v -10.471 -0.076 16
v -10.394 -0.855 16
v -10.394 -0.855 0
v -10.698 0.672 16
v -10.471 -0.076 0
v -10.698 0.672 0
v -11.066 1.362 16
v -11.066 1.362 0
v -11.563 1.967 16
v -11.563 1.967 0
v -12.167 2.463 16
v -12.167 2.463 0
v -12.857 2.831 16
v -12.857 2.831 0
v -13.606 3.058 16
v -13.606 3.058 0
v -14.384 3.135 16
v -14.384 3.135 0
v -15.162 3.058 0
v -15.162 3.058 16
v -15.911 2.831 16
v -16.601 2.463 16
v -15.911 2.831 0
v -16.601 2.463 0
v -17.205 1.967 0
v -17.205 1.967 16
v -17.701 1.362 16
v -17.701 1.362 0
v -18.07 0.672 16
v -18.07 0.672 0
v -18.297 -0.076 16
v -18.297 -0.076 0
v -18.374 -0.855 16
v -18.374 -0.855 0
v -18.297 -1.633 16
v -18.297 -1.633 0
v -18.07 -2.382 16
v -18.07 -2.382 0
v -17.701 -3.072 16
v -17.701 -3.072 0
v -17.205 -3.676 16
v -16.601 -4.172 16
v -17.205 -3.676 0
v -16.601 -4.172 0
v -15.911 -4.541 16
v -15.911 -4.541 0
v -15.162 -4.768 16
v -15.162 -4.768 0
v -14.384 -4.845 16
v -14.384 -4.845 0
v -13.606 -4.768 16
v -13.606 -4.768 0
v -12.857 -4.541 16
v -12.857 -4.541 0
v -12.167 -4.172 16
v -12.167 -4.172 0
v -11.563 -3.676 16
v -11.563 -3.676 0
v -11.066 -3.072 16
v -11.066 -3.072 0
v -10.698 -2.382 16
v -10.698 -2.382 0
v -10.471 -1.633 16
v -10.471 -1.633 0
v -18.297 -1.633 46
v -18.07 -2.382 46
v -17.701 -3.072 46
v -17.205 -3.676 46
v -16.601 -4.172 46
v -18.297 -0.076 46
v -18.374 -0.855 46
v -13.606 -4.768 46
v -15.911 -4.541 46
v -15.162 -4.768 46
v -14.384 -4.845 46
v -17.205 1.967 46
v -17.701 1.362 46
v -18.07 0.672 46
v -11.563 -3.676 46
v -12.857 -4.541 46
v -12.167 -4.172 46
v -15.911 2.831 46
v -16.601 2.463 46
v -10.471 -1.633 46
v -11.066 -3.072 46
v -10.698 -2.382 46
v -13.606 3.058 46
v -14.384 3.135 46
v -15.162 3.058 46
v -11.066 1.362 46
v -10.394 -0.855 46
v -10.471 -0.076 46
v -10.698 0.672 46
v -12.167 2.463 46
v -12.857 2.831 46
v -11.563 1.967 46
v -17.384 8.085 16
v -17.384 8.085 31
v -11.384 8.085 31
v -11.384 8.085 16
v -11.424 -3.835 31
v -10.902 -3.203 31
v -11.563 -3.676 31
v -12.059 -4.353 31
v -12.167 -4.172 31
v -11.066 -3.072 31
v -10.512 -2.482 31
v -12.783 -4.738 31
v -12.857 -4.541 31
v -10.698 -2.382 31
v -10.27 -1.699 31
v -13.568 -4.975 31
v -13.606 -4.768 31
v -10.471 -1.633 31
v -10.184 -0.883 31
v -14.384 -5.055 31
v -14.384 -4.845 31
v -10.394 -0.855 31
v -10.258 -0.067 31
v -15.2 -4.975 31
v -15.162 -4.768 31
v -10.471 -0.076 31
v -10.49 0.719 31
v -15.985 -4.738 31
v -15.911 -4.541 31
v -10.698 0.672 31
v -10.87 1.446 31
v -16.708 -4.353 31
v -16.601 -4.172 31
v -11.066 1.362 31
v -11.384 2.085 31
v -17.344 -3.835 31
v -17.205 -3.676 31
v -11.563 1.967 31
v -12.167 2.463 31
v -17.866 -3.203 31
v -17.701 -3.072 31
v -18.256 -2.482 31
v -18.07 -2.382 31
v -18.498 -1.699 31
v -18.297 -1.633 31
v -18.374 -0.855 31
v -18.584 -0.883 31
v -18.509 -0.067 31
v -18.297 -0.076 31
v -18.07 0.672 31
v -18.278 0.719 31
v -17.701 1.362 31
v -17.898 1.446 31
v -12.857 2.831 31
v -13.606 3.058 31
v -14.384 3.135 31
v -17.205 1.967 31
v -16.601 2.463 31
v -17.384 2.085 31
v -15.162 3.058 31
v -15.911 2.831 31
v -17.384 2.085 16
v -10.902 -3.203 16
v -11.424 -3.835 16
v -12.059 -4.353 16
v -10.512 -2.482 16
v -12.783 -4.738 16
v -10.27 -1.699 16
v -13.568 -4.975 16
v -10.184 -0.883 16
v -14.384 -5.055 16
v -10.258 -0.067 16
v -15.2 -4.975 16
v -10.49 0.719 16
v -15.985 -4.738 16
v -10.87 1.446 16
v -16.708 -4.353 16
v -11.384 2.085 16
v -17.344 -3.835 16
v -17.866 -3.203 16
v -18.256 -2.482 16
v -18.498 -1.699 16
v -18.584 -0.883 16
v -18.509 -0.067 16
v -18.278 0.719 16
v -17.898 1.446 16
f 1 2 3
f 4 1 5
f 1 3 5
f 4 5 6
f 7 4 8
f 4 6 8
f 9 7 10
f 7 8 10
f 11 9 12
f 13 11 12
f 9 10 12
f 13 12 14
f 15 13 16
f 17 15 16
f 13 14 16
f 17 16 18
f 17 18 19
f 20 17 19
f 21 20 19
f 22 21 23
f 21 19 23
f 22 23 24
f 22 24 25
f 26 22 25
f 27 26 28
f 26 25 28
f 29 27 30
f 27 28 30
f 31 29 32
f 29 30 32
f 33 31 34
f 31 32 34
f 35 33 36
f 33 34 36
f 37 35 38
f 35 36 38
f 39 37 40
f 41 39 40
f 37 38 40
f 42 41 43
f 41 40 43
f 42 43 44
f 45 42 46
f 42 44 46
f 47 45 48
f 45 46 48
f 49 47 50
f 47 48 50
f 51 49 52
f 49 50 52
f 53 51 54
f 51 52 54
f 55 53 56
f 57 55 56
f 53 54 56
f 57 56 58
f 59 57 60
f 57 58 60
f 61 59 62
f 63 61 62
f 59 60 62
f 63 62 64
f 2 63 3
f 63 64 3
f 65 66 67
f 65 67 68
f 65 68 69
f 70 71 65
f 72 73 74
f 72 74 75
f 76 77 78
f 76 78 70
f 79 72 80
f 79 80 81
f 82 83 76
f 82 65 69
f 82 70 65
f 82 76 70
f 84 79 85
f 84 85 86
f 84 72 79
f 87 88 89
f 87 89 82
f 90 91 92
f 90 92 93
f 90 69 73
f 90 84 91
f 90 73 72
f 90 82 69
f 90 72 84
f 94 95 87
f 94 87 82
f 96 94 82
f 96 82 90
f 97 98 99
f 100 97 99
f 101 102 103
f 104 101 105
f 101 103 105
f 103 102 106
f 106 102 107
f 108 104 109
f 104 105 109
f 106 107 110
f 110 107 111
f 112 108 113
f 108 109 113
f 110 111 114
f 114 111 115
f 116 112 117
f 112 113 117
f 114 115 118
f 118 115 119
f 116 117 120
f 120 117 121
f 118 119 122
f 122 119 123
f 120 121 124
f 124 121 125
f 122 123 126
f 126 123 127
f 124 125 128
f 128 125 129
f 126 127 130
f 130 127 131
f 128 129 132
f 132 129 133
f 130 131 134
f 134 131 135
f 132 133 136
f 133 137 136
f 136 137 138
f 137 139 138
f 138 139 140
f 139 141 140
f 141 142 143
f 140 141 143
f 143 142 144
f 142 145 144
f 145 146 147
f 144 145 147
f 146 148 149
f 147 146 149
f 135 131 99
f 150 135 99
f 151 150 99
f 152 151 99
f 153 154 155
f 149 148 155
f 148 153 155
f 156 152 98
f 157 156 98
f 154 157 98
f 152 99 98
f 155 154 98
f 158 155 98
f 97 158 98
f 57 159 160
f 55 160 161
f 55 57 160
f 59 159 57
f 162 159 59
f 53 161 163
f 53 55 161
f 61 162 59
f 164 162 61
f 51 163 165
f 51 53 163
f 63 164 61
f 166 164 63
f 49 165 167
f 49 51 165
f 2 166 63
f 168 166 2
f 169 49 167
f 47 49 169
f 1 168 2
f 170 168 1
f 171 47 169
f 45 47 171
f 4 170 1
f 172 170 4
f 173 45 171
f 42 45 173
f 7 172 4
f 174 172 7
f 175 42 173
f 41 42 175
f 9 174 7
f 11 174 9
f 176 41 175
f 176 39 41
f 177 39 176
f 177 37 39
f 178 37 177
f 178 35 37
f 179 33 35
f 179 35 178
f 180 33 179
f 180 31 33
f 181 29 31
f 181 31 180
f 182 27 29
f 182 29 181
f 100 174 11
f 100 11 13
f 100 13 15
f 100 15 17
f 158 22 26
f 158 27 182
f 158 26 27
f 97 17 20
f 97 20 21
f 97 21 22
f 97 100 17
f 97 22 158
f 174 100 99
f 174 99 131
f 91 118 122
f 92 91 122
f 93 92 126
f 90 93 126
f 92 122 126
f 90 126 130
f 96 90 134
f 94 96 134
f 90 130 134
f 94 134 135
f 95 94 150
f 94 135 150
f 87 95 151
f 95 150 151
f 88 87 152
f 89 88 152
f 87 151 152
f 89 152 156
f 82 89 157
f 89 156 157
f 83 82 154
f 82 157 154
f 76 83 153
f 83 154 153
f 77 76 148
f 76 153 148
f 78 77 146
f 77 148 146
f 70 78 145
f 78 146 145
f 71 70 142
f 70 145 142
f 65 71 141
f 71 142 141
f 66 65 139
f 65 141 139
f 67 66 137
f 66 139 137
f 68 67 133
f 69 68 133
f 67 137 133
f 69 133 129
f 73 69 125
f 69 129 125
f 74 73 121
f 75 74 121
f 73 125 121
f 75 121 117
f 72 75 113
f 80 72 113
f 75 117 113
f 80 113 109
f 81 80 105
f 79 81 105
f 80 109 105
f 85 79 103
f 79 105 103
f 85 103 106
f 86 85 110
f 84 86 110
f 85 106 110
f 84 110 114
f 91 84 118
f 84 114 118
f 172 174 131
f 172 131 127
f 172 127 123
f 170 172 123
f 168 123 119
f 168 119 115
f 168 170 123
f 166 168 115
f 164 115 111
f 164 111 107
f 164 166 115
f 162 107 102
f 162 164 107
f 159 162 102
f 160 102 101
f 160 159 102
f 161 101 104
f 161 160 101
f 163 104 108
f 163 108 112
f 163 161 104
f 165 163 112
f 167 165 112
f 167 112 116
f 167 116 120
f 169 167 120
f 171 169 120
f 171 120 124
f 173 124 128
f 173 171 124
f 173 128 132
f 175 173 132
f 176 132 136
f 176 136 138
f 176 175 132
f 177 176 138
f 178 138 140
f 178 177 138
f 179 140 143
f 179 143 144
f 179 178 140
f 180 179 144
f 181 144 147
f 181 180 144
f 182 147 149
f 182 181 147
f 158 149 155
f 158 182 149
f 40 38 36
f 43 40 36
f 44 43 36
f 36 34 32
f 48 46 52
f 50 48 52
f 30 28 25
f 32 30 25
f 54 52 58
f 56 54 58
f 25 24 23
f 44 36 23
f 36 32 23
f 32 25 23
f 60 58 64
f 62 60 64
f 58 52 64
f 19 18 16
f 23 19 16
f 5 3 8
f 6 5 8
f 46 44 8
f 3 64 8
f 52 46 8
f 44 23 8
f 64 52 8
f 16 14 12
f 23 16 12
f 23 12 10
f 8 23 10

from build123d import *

# Parameters (mm, degrees)
SKETCH1_R           = 3.99
BOSS_EXTRUDE1_DEPTH = 16
BOSS_EXTRUDE7_DEPTH = 15
SKETCH7_R           = 3.99
BOSS_EXTRUDE8_DEPTH = 15


with BuildPart() as part:
    # Sketch1 → Boss-Extrude1 (new body)
    with BuildSketch(Plane.XY):
        with Locations((-14.383915809, -0.854852817)):
            Circle(SKETCH1_R)
    extrude(amount=BOSS_EXTRUDE1_DEPTH)

    # Sketch6 → Boss-Extrude7 (add)
    with BuildSketch(Plane.XY.offset(16)):
        with BuildLine():
            Line((-17.383915809, 2.084534875), (-17.383915809, 8.084534875))
            Line((-17.383915809, 8.084534875), (-11.383915809, 8.084534875))
            Line((-11.383915809, 8.084534875), (-11.383915809, 2.084534875))
            ThreePointArc((-11.383915809, 2.084534875), (-14.383915809, -5.054852817), (-17.383915809, 2.084534875))
        make_face()
    extrude(amount=BOSS_EXTRUDE7_DEPTH)

    # Sketch7 → Boss-Extrude8 (add)
    with BuildSketch(Plane.XY.offset(31)):
        with Locations((-14.383915809, -0.854852817)):
            Circle(SKETCH7_R)
    extrude(amount=BOSS_EXTRUDE8_DEPTH)


solid = part.part
